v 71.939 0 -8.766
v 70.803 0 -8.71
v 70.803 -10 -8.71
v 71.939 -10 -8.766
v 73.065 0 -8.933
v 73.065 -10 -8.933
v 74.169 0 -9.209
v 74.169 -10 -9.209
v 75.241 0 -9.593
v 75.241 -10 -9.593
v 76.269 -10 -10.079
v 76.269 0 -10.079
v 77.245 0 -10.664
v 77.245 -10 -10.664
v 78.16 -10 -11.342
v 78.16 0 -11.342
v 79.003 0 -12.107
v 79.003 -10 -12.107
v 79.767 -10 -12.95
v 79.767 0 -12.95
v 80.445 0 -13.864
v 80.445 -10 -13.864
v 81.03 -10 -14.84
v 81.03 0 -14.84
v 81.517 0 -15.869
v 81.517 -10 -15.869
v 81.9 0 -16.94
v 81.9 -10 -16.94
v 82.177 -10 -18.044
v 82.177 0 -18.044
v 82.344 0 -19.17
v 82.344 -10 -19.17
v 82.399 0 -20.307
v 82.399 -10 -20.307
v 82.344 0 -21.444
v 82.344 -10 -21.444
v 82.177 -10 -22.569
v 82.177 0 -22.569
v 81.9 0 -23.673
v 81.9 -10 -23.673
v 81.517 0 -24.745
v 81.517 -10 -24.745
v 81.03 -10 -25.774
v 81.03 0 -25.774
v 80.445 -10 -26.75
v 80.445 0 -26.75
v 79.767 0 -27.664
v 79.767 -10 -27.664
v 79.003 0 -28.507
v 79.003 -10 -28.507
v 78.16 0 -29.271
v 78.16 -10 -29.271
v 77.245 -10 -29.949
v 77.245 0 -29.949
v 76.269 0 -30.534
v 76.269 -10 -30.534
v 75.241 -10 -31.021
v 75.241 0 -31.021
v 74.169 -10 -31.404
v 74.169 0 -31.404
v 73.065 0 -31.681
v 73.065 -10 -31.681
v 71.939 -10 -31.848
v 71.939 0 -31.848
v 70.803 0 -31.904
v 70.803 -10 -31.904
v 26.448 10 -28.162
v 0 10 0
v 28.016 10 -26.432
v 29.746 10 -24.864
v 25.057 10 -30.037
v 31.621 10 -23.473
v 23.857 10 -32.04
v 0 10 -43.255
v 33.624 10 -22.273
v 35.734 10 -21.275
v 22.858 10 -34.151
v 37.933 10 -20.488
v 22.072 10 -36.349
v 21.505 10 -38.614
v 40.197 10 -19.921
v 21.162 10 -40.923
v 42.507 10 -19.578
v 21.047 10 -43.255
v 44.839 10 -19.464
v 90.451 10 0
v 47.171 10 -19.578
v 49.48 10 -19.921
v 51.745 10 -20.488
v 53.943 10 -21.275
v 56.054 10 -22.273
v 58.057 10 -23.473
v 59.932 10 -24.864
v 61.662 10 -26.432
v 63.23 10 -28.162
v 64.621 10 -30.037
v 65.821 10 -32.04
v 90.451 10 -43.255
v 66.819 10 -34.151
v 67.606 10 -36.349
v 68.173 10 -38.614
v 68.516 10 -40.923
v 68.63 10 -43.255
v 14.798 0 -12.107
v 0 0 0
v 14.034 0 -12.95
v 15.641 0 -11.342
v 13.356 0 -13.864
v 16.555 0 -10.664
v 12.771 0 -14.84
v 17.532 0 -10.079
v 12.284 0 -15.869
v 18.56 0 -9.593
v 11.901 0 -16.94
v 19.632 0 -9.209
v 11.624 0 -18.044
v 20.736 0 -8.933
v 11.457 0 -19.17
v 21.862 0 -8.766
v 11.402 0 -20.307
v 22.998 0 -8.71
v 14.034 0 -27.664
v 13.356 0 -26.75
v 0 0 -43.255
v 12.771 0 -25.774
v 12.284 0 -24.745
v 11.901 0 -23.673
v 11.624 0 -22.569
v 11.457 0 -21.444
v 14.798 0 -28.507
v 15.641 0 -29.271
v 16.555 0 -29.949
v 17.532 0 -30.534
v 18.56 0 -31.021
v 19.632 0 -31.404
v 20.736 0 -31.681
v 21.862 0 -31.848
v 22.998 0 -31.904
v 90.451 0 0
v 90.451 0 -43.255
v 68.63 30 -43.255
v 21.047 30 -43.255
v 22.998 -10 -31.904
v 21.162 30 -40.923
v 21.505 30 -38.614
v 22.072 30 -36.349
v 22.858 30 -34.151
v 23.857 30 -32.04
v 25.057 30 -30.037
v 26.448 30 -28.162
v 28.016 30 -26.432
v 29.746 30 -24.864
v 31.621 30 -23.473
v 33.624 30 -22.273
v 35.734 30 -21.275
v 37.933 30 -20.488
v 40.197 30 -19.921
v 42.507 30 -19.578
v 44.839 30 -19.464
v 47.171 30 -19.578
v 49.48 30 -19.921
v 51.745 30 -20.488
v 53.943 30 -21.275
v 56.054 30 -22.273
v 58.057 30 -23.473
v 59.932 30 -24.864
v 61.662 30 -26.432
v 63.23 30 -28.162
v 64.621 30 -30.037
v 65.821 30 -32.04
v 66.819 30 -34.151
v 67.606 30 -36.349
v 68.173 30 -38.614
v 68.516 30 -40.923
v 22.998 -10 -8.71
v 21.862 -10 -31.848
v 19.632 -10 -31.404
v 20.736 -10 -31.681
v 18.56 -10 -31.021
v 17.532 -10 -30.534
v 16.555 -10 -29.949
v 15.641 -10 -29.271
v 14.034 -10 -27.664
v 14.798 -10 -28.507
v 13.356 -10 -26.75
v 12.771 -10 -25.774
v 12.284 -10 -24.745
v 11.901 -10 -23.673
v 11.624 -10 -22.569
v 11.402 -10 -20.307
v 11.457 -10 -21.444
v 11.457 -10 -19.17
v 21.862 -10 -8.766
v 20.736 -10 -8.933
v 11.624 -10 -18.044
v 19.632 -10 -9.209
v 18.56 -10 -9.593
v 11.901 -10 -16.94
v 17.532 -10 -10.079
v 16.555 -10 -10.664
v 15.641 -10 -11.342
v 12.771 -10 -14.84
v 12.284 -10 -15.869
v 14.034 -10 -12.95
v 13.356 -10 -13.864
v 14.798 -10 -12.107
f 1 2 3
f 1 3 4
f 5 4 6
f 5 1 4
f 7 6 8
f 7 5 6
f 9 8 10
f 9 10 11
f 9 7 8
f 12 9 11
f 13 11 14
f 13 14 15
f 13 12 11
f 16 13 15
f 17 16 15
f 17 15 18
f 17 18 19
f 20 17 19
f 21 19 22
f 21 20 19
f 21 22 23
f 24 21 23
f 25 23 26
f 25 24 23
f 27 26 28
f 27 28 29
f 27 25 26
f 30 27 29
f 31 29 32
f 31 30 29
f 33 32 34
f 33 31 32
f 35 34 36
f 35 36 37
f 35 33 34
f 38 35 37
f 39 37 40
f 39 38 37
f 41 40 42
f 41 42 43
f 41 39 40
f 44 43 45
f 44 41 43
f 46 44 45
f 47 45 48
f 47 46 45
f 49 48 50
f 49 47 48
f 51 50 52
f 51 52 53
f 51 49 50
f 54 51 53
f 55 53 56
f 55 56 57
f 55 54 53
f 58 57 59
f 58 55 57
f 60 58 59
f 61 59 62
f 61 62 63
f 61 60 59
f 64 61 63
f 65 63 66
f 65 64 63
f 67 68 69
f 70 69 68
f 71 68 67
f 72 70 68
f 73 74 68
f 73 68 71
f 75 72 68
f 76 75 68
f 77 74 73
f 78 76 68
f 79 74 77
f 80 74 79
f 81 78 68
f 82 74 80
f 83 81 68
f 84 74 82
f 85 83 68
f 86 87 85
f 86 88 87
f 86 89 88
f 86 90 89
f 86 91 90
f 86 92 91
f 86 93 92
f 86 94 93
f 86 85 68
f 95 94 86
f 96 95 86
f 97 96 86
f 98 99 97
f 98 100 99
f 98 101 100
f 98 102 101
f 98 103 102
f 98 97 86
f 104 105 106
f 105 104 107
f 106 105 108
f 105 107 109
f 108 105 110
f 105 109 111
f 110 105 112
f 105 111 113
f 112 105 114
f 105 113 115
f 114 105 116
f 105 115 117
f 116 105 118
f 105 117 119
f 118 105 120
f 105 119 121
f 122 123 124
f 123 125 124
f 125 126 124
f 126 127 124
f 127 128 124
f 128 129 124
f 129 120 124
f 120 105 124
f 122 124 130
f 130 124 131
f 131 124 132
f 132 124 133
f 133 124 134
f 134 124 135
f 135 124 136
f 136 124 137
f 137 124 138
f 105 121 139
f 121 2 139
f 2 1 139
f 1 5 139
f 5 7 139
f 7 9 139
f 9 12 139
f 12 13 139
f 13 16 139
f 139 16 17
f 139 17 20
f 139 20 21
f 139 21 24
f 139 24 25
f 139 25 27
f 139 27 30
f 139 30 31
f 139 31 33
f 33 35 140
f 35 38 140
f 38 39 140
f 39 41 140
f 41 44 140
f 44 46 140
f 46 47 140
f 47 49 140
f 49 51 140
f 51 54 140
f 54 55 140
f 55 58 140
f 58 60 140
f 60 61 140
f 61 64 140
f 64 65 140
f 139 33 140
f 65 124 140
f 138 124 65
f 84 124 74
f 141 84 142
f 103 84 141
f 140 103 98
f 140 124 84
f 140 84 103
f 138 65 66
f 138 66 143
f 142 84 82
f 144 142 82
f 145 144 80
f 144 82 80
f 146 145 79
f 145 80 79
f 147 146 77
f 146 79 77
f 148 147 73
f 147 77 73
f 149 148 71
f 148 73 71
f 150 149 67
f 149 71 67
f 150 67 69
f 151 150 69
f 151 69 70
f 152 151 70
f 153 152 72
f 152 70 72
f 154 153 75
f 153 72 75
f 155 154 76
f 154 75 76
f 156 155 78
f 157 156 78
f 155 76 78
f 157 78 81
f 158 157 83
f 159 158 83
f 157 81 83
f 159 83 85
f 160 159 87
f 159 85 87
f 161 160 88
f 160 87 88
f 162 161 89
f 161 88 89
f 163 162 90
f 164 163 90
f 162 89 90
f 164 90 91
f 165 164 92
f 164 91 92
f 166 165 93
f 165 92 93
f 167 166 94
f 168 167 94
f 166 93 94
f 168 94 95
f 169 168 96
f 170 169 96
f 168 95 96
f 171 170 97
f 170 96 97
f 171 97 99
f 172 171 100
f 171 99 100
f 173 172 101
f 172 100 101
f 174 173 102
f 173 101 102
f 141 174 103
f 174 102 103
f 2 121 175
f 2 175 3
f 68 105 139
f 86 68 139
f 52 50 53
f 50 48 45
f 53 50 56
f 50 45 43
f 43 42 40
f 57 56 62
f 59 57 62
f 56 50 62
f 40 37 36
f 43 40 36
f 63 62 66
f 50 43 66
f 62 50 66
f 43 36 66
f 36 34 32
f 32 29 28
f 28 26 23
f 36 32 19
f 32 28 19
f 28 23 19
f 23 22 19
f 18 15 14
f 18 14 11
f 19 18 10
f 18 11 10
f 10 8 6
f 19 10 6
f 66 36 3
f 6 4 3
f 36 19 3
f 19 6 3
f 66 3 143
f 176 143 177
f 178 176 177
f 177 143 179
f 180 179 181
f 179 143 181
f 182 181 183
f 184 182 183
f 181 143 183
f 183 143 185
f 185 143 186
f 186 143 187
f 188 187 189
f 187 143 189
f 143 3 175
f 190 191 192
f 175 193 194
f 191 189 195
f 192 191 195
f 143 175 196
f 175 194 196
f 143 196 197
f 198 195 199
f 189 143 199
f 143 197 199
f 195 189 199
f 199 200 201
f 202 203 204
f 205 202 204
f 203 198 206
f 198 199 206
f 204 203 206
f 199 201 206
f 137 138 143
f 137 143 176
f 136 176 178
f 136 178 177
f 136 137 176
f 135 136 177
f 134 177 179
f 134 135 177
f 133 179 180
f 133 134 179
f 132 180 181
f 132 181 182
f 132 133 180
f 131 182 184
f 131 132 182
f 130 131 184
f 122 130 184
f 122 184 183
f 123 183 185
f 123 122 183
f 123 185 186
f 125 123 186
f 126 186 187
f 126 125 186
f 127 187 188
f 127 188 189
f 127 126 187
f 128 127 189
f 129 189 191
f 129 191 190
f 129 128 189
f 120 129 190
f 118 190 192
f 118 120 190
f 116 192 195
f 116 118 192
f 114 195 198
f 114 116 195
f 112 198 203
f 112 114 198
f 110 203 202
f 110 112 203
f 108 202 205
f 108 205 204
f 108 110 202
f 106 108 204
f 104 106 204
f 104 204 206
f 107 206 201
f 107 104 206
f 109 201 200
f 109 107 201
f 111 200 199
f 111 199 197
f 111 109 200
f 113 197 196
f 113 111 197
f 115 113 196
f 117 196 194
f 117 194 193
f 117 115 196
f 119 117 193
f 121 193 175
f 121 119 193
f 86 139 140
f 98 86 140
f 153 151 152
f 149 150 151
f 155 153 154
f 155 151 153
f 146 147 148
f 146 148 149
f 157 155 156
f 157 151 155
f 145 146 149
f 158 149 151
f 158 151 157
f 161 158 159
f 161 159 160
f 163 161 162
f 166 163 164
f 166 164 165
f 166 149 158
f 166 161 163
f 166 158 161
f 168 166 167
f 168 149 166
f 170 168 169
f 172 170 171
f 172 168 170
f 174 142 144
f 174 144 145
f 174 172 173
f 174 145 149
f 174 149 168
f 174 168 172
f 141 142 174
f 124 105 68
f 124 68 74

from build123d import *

# Parameters (mm, degrees)
SKETCH_1_W      = 90.450741223
SKETCH_1_H      = 43.255156446
EXTRUDE_1_DEPTH = 10
EXTRUDE_2_DEPTH = 20
EXTRUDE_3_DEPTH = 10


with BuildPart() as part:
    # 草图1 → 凸台-拉伸1 (new body)
    with BuildSketch(Plane(origin=(0, 0, 0), x_dir=(1, 0, 0), z_dir=(0, 1, 0))):
        with Locations((45.225370612, 21.627578223)):
            Rectangle(SKETCH_1_W, SKETCH_1_H)
    extrude(amount=EXTRUDE_1_DEPTH)

    # 草图2 → 凸台-拉伸2 (add)
    with BuildSketch(Plane(origin=(0, 10, 0), x_dir=(1, 0, 0), z_dir=(0, 1, 0))):
        with BuildLine():
            Line((68.630258788, 43.255156446), (21.047365446, 43.255156446))
            ThreePointArc((21.047365446, 43.255156446), (44.838812117, 19.463709775), (68.630258788, 43.255156446))
        make_face()
    extrude(amount=EXTRUDE_2_DEPTH)

    # 草图3 → 凸台-拉伸3 (add)
    with BuildSketch(Plane.XZ):
        with BuildLine():
            Line((22.99825717, -8.71008186), (70.802657673, -8.71008186))
            ThreePointArc((70.802657673, -8.71008186), (82.399412512, -20.3068367), (70.802657673, -31.903591539))
            Line((70.802657673, -31.903591539), (22.99825717, -31.903591539))
            ThreePointArc((22.99825717, -31.903591539), (11.40150233, -20.3068367), (22.99825717, -8.71008186))
        make_face()
    extrude(amount=EXTRUDE_3_DEPTH)


solid = part.part
